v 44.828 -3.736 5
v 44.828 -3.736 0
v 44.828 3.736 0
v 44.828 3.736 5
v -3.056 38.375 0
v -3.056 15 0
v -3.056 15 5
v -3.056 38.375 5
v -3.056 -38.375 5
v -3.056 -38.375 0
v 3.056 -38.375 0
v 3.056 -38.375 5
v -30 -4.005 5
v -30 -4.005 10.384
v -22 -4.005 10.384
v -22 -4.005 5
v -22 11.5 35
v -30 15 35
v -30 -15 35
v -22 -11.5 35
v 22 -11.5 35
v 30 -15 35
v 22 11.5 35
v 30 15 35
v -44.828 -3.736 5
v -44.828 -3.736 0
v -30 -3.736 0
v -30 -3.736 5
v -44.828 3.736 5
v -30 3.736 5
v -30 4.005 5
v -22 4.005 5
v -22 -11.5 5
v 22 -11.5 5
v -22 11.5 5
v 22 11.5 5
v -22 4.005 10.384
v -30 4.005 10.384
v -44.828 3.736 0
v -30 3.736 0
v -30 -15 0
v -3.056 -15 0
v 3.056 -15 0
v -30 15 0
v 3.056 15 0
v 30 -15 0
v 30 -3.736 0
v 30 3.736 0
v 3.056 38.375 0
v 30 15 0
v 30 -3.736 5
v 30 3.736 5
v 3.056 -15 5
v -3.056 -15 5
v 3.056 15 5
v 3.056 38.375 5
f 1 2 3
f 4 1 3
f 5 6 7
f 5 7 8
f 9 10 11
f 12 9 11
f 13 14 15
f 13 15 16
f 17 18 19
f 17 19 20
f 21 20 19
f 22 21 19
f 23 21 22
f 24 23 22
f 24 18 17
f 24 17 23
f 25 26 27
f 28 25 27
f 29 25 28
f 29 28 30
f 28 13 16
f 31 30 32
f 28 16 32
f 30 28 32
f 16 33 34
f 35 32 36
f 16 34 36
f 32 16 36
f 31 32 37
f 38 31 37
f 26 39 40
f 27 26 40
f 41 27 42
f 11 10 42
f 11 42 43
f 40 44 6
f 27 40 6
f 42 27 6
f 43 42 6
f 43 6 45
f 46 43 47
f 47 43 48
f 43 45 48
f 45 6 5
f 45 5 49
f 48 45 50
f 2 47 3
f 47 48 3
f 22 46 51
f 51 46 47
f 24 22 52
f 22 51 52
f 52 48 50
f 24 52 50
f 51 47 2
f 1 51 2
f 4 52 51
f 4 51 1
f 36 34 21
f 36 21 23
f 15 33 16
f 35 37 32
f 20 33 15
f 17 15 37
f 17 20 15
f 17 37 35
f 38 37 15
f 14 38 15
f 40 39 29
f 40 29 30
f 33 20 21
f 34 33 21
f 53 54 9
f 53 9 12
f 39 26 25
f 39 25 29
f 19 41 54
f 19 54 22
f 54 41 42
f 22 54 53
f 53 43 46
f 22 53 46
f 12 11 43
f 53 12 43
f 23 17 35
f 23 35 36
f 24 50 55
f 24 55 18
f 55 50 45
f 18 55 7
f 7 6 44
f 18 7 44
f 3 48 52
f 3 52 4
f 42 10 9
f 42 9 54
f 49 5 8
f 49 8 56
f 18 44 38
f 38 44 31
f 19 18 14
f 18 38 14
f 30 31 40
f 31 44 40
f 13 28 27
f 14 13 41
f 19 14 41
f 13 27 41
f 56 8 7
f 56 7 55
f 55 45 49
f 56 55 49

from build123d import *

# Parameters (mm, degrees)
F0_W     = 26.9435550738
F0_H     = 11.2643459439
F0_H_2   = 7.4713081121
F0_W_2   = 6.1128898524
F1_DEPTH = 35
F0_H_3   = 23.3753739297
F0_W_3   = 14.827863574
F2_DEPTH = 5
F3_W     = 44
F3_H     = 23
F4_DEPTH = 30
F6_DEPTH = 25


with BuildPart() as f1:
    # F0 (on Top) → F1 (new body)
    with BuildSketch(Plane.XY):
        with Locations((16.5282224631, 9.367827028)):
            Rectangle(F0_W, F0_H)
        with Locations((16.5282224631, -9.367827028)):
            Rectangle(F0_W, F0_H)
        with Locations((16.5282224631, 0)):
            Rectangle(F0_W, F0_H_2)
        with Locations((-16.5282224631, 9.367827028)):
            Rectangle(F0_W, F0_H)
        with Locations((-16.5282224631, 0)):
            Rectangle(F0_W, F0_H_2)
        with Locations((-16.5282224631, -9.367827028)):
            Rectangle(F0_W, F0_H)
        with Locations((0, -9.367827028)):
            Rectangle(F0_W_2, F0_H)
        Rectangle(F0_W_2, F0_H_2)
        with Locations((0, 9.367827028)):
            Rectangle(F0_W_2, F0_H)
    extrude(amount=F1_DEPTH)

    # F0 (on Top) → F2 (join)
    with BuildSketch(Plane.XY):
        with Locations((0, 26.6876869649)):
            Rectangle(F0_W_2, F0_H_3)
        with Locations((37.413931787, 0)):
            Rectangle(F0_W_3, F0_H_2)
        with Locations((-37.413931787, 0)):
            Rectangle(F0_W_3, F0_H_2)
        with Locations((0, -26.6876869649)):
            Rectangle(F0_W_2, F0_H_3)
    extrude(amount=F2_DEPTH)

    # F3 (on face) → F4 (cut)
    with BuildSketch(Plane.XY.offset(35)):
        Rectangle(F3_W, F3_H)
    extrude(amount=-F4_DEPTH, mode=Mode.SUBTRACT)

    # F5 (on face) → F6 (cut)
    with BuildSketch(Plane.YZ.offset(-22)):
        Polygon((-4.0054083802, 5), (0, 5), (0, 7.6920529827), (0, 10.3841059655), (-4.0054083802, 10.3841059655), align=None)
        Polygon((0, 7.6920529827), (0, 5), (4.0054083802, 5), (4.0054083802, 10.3841059655), (0, 10.3841059655), align=None)
    extrude(amount=-F6_DEPTH, mode=Mode.SUBTRACT)


solid = f1.part
